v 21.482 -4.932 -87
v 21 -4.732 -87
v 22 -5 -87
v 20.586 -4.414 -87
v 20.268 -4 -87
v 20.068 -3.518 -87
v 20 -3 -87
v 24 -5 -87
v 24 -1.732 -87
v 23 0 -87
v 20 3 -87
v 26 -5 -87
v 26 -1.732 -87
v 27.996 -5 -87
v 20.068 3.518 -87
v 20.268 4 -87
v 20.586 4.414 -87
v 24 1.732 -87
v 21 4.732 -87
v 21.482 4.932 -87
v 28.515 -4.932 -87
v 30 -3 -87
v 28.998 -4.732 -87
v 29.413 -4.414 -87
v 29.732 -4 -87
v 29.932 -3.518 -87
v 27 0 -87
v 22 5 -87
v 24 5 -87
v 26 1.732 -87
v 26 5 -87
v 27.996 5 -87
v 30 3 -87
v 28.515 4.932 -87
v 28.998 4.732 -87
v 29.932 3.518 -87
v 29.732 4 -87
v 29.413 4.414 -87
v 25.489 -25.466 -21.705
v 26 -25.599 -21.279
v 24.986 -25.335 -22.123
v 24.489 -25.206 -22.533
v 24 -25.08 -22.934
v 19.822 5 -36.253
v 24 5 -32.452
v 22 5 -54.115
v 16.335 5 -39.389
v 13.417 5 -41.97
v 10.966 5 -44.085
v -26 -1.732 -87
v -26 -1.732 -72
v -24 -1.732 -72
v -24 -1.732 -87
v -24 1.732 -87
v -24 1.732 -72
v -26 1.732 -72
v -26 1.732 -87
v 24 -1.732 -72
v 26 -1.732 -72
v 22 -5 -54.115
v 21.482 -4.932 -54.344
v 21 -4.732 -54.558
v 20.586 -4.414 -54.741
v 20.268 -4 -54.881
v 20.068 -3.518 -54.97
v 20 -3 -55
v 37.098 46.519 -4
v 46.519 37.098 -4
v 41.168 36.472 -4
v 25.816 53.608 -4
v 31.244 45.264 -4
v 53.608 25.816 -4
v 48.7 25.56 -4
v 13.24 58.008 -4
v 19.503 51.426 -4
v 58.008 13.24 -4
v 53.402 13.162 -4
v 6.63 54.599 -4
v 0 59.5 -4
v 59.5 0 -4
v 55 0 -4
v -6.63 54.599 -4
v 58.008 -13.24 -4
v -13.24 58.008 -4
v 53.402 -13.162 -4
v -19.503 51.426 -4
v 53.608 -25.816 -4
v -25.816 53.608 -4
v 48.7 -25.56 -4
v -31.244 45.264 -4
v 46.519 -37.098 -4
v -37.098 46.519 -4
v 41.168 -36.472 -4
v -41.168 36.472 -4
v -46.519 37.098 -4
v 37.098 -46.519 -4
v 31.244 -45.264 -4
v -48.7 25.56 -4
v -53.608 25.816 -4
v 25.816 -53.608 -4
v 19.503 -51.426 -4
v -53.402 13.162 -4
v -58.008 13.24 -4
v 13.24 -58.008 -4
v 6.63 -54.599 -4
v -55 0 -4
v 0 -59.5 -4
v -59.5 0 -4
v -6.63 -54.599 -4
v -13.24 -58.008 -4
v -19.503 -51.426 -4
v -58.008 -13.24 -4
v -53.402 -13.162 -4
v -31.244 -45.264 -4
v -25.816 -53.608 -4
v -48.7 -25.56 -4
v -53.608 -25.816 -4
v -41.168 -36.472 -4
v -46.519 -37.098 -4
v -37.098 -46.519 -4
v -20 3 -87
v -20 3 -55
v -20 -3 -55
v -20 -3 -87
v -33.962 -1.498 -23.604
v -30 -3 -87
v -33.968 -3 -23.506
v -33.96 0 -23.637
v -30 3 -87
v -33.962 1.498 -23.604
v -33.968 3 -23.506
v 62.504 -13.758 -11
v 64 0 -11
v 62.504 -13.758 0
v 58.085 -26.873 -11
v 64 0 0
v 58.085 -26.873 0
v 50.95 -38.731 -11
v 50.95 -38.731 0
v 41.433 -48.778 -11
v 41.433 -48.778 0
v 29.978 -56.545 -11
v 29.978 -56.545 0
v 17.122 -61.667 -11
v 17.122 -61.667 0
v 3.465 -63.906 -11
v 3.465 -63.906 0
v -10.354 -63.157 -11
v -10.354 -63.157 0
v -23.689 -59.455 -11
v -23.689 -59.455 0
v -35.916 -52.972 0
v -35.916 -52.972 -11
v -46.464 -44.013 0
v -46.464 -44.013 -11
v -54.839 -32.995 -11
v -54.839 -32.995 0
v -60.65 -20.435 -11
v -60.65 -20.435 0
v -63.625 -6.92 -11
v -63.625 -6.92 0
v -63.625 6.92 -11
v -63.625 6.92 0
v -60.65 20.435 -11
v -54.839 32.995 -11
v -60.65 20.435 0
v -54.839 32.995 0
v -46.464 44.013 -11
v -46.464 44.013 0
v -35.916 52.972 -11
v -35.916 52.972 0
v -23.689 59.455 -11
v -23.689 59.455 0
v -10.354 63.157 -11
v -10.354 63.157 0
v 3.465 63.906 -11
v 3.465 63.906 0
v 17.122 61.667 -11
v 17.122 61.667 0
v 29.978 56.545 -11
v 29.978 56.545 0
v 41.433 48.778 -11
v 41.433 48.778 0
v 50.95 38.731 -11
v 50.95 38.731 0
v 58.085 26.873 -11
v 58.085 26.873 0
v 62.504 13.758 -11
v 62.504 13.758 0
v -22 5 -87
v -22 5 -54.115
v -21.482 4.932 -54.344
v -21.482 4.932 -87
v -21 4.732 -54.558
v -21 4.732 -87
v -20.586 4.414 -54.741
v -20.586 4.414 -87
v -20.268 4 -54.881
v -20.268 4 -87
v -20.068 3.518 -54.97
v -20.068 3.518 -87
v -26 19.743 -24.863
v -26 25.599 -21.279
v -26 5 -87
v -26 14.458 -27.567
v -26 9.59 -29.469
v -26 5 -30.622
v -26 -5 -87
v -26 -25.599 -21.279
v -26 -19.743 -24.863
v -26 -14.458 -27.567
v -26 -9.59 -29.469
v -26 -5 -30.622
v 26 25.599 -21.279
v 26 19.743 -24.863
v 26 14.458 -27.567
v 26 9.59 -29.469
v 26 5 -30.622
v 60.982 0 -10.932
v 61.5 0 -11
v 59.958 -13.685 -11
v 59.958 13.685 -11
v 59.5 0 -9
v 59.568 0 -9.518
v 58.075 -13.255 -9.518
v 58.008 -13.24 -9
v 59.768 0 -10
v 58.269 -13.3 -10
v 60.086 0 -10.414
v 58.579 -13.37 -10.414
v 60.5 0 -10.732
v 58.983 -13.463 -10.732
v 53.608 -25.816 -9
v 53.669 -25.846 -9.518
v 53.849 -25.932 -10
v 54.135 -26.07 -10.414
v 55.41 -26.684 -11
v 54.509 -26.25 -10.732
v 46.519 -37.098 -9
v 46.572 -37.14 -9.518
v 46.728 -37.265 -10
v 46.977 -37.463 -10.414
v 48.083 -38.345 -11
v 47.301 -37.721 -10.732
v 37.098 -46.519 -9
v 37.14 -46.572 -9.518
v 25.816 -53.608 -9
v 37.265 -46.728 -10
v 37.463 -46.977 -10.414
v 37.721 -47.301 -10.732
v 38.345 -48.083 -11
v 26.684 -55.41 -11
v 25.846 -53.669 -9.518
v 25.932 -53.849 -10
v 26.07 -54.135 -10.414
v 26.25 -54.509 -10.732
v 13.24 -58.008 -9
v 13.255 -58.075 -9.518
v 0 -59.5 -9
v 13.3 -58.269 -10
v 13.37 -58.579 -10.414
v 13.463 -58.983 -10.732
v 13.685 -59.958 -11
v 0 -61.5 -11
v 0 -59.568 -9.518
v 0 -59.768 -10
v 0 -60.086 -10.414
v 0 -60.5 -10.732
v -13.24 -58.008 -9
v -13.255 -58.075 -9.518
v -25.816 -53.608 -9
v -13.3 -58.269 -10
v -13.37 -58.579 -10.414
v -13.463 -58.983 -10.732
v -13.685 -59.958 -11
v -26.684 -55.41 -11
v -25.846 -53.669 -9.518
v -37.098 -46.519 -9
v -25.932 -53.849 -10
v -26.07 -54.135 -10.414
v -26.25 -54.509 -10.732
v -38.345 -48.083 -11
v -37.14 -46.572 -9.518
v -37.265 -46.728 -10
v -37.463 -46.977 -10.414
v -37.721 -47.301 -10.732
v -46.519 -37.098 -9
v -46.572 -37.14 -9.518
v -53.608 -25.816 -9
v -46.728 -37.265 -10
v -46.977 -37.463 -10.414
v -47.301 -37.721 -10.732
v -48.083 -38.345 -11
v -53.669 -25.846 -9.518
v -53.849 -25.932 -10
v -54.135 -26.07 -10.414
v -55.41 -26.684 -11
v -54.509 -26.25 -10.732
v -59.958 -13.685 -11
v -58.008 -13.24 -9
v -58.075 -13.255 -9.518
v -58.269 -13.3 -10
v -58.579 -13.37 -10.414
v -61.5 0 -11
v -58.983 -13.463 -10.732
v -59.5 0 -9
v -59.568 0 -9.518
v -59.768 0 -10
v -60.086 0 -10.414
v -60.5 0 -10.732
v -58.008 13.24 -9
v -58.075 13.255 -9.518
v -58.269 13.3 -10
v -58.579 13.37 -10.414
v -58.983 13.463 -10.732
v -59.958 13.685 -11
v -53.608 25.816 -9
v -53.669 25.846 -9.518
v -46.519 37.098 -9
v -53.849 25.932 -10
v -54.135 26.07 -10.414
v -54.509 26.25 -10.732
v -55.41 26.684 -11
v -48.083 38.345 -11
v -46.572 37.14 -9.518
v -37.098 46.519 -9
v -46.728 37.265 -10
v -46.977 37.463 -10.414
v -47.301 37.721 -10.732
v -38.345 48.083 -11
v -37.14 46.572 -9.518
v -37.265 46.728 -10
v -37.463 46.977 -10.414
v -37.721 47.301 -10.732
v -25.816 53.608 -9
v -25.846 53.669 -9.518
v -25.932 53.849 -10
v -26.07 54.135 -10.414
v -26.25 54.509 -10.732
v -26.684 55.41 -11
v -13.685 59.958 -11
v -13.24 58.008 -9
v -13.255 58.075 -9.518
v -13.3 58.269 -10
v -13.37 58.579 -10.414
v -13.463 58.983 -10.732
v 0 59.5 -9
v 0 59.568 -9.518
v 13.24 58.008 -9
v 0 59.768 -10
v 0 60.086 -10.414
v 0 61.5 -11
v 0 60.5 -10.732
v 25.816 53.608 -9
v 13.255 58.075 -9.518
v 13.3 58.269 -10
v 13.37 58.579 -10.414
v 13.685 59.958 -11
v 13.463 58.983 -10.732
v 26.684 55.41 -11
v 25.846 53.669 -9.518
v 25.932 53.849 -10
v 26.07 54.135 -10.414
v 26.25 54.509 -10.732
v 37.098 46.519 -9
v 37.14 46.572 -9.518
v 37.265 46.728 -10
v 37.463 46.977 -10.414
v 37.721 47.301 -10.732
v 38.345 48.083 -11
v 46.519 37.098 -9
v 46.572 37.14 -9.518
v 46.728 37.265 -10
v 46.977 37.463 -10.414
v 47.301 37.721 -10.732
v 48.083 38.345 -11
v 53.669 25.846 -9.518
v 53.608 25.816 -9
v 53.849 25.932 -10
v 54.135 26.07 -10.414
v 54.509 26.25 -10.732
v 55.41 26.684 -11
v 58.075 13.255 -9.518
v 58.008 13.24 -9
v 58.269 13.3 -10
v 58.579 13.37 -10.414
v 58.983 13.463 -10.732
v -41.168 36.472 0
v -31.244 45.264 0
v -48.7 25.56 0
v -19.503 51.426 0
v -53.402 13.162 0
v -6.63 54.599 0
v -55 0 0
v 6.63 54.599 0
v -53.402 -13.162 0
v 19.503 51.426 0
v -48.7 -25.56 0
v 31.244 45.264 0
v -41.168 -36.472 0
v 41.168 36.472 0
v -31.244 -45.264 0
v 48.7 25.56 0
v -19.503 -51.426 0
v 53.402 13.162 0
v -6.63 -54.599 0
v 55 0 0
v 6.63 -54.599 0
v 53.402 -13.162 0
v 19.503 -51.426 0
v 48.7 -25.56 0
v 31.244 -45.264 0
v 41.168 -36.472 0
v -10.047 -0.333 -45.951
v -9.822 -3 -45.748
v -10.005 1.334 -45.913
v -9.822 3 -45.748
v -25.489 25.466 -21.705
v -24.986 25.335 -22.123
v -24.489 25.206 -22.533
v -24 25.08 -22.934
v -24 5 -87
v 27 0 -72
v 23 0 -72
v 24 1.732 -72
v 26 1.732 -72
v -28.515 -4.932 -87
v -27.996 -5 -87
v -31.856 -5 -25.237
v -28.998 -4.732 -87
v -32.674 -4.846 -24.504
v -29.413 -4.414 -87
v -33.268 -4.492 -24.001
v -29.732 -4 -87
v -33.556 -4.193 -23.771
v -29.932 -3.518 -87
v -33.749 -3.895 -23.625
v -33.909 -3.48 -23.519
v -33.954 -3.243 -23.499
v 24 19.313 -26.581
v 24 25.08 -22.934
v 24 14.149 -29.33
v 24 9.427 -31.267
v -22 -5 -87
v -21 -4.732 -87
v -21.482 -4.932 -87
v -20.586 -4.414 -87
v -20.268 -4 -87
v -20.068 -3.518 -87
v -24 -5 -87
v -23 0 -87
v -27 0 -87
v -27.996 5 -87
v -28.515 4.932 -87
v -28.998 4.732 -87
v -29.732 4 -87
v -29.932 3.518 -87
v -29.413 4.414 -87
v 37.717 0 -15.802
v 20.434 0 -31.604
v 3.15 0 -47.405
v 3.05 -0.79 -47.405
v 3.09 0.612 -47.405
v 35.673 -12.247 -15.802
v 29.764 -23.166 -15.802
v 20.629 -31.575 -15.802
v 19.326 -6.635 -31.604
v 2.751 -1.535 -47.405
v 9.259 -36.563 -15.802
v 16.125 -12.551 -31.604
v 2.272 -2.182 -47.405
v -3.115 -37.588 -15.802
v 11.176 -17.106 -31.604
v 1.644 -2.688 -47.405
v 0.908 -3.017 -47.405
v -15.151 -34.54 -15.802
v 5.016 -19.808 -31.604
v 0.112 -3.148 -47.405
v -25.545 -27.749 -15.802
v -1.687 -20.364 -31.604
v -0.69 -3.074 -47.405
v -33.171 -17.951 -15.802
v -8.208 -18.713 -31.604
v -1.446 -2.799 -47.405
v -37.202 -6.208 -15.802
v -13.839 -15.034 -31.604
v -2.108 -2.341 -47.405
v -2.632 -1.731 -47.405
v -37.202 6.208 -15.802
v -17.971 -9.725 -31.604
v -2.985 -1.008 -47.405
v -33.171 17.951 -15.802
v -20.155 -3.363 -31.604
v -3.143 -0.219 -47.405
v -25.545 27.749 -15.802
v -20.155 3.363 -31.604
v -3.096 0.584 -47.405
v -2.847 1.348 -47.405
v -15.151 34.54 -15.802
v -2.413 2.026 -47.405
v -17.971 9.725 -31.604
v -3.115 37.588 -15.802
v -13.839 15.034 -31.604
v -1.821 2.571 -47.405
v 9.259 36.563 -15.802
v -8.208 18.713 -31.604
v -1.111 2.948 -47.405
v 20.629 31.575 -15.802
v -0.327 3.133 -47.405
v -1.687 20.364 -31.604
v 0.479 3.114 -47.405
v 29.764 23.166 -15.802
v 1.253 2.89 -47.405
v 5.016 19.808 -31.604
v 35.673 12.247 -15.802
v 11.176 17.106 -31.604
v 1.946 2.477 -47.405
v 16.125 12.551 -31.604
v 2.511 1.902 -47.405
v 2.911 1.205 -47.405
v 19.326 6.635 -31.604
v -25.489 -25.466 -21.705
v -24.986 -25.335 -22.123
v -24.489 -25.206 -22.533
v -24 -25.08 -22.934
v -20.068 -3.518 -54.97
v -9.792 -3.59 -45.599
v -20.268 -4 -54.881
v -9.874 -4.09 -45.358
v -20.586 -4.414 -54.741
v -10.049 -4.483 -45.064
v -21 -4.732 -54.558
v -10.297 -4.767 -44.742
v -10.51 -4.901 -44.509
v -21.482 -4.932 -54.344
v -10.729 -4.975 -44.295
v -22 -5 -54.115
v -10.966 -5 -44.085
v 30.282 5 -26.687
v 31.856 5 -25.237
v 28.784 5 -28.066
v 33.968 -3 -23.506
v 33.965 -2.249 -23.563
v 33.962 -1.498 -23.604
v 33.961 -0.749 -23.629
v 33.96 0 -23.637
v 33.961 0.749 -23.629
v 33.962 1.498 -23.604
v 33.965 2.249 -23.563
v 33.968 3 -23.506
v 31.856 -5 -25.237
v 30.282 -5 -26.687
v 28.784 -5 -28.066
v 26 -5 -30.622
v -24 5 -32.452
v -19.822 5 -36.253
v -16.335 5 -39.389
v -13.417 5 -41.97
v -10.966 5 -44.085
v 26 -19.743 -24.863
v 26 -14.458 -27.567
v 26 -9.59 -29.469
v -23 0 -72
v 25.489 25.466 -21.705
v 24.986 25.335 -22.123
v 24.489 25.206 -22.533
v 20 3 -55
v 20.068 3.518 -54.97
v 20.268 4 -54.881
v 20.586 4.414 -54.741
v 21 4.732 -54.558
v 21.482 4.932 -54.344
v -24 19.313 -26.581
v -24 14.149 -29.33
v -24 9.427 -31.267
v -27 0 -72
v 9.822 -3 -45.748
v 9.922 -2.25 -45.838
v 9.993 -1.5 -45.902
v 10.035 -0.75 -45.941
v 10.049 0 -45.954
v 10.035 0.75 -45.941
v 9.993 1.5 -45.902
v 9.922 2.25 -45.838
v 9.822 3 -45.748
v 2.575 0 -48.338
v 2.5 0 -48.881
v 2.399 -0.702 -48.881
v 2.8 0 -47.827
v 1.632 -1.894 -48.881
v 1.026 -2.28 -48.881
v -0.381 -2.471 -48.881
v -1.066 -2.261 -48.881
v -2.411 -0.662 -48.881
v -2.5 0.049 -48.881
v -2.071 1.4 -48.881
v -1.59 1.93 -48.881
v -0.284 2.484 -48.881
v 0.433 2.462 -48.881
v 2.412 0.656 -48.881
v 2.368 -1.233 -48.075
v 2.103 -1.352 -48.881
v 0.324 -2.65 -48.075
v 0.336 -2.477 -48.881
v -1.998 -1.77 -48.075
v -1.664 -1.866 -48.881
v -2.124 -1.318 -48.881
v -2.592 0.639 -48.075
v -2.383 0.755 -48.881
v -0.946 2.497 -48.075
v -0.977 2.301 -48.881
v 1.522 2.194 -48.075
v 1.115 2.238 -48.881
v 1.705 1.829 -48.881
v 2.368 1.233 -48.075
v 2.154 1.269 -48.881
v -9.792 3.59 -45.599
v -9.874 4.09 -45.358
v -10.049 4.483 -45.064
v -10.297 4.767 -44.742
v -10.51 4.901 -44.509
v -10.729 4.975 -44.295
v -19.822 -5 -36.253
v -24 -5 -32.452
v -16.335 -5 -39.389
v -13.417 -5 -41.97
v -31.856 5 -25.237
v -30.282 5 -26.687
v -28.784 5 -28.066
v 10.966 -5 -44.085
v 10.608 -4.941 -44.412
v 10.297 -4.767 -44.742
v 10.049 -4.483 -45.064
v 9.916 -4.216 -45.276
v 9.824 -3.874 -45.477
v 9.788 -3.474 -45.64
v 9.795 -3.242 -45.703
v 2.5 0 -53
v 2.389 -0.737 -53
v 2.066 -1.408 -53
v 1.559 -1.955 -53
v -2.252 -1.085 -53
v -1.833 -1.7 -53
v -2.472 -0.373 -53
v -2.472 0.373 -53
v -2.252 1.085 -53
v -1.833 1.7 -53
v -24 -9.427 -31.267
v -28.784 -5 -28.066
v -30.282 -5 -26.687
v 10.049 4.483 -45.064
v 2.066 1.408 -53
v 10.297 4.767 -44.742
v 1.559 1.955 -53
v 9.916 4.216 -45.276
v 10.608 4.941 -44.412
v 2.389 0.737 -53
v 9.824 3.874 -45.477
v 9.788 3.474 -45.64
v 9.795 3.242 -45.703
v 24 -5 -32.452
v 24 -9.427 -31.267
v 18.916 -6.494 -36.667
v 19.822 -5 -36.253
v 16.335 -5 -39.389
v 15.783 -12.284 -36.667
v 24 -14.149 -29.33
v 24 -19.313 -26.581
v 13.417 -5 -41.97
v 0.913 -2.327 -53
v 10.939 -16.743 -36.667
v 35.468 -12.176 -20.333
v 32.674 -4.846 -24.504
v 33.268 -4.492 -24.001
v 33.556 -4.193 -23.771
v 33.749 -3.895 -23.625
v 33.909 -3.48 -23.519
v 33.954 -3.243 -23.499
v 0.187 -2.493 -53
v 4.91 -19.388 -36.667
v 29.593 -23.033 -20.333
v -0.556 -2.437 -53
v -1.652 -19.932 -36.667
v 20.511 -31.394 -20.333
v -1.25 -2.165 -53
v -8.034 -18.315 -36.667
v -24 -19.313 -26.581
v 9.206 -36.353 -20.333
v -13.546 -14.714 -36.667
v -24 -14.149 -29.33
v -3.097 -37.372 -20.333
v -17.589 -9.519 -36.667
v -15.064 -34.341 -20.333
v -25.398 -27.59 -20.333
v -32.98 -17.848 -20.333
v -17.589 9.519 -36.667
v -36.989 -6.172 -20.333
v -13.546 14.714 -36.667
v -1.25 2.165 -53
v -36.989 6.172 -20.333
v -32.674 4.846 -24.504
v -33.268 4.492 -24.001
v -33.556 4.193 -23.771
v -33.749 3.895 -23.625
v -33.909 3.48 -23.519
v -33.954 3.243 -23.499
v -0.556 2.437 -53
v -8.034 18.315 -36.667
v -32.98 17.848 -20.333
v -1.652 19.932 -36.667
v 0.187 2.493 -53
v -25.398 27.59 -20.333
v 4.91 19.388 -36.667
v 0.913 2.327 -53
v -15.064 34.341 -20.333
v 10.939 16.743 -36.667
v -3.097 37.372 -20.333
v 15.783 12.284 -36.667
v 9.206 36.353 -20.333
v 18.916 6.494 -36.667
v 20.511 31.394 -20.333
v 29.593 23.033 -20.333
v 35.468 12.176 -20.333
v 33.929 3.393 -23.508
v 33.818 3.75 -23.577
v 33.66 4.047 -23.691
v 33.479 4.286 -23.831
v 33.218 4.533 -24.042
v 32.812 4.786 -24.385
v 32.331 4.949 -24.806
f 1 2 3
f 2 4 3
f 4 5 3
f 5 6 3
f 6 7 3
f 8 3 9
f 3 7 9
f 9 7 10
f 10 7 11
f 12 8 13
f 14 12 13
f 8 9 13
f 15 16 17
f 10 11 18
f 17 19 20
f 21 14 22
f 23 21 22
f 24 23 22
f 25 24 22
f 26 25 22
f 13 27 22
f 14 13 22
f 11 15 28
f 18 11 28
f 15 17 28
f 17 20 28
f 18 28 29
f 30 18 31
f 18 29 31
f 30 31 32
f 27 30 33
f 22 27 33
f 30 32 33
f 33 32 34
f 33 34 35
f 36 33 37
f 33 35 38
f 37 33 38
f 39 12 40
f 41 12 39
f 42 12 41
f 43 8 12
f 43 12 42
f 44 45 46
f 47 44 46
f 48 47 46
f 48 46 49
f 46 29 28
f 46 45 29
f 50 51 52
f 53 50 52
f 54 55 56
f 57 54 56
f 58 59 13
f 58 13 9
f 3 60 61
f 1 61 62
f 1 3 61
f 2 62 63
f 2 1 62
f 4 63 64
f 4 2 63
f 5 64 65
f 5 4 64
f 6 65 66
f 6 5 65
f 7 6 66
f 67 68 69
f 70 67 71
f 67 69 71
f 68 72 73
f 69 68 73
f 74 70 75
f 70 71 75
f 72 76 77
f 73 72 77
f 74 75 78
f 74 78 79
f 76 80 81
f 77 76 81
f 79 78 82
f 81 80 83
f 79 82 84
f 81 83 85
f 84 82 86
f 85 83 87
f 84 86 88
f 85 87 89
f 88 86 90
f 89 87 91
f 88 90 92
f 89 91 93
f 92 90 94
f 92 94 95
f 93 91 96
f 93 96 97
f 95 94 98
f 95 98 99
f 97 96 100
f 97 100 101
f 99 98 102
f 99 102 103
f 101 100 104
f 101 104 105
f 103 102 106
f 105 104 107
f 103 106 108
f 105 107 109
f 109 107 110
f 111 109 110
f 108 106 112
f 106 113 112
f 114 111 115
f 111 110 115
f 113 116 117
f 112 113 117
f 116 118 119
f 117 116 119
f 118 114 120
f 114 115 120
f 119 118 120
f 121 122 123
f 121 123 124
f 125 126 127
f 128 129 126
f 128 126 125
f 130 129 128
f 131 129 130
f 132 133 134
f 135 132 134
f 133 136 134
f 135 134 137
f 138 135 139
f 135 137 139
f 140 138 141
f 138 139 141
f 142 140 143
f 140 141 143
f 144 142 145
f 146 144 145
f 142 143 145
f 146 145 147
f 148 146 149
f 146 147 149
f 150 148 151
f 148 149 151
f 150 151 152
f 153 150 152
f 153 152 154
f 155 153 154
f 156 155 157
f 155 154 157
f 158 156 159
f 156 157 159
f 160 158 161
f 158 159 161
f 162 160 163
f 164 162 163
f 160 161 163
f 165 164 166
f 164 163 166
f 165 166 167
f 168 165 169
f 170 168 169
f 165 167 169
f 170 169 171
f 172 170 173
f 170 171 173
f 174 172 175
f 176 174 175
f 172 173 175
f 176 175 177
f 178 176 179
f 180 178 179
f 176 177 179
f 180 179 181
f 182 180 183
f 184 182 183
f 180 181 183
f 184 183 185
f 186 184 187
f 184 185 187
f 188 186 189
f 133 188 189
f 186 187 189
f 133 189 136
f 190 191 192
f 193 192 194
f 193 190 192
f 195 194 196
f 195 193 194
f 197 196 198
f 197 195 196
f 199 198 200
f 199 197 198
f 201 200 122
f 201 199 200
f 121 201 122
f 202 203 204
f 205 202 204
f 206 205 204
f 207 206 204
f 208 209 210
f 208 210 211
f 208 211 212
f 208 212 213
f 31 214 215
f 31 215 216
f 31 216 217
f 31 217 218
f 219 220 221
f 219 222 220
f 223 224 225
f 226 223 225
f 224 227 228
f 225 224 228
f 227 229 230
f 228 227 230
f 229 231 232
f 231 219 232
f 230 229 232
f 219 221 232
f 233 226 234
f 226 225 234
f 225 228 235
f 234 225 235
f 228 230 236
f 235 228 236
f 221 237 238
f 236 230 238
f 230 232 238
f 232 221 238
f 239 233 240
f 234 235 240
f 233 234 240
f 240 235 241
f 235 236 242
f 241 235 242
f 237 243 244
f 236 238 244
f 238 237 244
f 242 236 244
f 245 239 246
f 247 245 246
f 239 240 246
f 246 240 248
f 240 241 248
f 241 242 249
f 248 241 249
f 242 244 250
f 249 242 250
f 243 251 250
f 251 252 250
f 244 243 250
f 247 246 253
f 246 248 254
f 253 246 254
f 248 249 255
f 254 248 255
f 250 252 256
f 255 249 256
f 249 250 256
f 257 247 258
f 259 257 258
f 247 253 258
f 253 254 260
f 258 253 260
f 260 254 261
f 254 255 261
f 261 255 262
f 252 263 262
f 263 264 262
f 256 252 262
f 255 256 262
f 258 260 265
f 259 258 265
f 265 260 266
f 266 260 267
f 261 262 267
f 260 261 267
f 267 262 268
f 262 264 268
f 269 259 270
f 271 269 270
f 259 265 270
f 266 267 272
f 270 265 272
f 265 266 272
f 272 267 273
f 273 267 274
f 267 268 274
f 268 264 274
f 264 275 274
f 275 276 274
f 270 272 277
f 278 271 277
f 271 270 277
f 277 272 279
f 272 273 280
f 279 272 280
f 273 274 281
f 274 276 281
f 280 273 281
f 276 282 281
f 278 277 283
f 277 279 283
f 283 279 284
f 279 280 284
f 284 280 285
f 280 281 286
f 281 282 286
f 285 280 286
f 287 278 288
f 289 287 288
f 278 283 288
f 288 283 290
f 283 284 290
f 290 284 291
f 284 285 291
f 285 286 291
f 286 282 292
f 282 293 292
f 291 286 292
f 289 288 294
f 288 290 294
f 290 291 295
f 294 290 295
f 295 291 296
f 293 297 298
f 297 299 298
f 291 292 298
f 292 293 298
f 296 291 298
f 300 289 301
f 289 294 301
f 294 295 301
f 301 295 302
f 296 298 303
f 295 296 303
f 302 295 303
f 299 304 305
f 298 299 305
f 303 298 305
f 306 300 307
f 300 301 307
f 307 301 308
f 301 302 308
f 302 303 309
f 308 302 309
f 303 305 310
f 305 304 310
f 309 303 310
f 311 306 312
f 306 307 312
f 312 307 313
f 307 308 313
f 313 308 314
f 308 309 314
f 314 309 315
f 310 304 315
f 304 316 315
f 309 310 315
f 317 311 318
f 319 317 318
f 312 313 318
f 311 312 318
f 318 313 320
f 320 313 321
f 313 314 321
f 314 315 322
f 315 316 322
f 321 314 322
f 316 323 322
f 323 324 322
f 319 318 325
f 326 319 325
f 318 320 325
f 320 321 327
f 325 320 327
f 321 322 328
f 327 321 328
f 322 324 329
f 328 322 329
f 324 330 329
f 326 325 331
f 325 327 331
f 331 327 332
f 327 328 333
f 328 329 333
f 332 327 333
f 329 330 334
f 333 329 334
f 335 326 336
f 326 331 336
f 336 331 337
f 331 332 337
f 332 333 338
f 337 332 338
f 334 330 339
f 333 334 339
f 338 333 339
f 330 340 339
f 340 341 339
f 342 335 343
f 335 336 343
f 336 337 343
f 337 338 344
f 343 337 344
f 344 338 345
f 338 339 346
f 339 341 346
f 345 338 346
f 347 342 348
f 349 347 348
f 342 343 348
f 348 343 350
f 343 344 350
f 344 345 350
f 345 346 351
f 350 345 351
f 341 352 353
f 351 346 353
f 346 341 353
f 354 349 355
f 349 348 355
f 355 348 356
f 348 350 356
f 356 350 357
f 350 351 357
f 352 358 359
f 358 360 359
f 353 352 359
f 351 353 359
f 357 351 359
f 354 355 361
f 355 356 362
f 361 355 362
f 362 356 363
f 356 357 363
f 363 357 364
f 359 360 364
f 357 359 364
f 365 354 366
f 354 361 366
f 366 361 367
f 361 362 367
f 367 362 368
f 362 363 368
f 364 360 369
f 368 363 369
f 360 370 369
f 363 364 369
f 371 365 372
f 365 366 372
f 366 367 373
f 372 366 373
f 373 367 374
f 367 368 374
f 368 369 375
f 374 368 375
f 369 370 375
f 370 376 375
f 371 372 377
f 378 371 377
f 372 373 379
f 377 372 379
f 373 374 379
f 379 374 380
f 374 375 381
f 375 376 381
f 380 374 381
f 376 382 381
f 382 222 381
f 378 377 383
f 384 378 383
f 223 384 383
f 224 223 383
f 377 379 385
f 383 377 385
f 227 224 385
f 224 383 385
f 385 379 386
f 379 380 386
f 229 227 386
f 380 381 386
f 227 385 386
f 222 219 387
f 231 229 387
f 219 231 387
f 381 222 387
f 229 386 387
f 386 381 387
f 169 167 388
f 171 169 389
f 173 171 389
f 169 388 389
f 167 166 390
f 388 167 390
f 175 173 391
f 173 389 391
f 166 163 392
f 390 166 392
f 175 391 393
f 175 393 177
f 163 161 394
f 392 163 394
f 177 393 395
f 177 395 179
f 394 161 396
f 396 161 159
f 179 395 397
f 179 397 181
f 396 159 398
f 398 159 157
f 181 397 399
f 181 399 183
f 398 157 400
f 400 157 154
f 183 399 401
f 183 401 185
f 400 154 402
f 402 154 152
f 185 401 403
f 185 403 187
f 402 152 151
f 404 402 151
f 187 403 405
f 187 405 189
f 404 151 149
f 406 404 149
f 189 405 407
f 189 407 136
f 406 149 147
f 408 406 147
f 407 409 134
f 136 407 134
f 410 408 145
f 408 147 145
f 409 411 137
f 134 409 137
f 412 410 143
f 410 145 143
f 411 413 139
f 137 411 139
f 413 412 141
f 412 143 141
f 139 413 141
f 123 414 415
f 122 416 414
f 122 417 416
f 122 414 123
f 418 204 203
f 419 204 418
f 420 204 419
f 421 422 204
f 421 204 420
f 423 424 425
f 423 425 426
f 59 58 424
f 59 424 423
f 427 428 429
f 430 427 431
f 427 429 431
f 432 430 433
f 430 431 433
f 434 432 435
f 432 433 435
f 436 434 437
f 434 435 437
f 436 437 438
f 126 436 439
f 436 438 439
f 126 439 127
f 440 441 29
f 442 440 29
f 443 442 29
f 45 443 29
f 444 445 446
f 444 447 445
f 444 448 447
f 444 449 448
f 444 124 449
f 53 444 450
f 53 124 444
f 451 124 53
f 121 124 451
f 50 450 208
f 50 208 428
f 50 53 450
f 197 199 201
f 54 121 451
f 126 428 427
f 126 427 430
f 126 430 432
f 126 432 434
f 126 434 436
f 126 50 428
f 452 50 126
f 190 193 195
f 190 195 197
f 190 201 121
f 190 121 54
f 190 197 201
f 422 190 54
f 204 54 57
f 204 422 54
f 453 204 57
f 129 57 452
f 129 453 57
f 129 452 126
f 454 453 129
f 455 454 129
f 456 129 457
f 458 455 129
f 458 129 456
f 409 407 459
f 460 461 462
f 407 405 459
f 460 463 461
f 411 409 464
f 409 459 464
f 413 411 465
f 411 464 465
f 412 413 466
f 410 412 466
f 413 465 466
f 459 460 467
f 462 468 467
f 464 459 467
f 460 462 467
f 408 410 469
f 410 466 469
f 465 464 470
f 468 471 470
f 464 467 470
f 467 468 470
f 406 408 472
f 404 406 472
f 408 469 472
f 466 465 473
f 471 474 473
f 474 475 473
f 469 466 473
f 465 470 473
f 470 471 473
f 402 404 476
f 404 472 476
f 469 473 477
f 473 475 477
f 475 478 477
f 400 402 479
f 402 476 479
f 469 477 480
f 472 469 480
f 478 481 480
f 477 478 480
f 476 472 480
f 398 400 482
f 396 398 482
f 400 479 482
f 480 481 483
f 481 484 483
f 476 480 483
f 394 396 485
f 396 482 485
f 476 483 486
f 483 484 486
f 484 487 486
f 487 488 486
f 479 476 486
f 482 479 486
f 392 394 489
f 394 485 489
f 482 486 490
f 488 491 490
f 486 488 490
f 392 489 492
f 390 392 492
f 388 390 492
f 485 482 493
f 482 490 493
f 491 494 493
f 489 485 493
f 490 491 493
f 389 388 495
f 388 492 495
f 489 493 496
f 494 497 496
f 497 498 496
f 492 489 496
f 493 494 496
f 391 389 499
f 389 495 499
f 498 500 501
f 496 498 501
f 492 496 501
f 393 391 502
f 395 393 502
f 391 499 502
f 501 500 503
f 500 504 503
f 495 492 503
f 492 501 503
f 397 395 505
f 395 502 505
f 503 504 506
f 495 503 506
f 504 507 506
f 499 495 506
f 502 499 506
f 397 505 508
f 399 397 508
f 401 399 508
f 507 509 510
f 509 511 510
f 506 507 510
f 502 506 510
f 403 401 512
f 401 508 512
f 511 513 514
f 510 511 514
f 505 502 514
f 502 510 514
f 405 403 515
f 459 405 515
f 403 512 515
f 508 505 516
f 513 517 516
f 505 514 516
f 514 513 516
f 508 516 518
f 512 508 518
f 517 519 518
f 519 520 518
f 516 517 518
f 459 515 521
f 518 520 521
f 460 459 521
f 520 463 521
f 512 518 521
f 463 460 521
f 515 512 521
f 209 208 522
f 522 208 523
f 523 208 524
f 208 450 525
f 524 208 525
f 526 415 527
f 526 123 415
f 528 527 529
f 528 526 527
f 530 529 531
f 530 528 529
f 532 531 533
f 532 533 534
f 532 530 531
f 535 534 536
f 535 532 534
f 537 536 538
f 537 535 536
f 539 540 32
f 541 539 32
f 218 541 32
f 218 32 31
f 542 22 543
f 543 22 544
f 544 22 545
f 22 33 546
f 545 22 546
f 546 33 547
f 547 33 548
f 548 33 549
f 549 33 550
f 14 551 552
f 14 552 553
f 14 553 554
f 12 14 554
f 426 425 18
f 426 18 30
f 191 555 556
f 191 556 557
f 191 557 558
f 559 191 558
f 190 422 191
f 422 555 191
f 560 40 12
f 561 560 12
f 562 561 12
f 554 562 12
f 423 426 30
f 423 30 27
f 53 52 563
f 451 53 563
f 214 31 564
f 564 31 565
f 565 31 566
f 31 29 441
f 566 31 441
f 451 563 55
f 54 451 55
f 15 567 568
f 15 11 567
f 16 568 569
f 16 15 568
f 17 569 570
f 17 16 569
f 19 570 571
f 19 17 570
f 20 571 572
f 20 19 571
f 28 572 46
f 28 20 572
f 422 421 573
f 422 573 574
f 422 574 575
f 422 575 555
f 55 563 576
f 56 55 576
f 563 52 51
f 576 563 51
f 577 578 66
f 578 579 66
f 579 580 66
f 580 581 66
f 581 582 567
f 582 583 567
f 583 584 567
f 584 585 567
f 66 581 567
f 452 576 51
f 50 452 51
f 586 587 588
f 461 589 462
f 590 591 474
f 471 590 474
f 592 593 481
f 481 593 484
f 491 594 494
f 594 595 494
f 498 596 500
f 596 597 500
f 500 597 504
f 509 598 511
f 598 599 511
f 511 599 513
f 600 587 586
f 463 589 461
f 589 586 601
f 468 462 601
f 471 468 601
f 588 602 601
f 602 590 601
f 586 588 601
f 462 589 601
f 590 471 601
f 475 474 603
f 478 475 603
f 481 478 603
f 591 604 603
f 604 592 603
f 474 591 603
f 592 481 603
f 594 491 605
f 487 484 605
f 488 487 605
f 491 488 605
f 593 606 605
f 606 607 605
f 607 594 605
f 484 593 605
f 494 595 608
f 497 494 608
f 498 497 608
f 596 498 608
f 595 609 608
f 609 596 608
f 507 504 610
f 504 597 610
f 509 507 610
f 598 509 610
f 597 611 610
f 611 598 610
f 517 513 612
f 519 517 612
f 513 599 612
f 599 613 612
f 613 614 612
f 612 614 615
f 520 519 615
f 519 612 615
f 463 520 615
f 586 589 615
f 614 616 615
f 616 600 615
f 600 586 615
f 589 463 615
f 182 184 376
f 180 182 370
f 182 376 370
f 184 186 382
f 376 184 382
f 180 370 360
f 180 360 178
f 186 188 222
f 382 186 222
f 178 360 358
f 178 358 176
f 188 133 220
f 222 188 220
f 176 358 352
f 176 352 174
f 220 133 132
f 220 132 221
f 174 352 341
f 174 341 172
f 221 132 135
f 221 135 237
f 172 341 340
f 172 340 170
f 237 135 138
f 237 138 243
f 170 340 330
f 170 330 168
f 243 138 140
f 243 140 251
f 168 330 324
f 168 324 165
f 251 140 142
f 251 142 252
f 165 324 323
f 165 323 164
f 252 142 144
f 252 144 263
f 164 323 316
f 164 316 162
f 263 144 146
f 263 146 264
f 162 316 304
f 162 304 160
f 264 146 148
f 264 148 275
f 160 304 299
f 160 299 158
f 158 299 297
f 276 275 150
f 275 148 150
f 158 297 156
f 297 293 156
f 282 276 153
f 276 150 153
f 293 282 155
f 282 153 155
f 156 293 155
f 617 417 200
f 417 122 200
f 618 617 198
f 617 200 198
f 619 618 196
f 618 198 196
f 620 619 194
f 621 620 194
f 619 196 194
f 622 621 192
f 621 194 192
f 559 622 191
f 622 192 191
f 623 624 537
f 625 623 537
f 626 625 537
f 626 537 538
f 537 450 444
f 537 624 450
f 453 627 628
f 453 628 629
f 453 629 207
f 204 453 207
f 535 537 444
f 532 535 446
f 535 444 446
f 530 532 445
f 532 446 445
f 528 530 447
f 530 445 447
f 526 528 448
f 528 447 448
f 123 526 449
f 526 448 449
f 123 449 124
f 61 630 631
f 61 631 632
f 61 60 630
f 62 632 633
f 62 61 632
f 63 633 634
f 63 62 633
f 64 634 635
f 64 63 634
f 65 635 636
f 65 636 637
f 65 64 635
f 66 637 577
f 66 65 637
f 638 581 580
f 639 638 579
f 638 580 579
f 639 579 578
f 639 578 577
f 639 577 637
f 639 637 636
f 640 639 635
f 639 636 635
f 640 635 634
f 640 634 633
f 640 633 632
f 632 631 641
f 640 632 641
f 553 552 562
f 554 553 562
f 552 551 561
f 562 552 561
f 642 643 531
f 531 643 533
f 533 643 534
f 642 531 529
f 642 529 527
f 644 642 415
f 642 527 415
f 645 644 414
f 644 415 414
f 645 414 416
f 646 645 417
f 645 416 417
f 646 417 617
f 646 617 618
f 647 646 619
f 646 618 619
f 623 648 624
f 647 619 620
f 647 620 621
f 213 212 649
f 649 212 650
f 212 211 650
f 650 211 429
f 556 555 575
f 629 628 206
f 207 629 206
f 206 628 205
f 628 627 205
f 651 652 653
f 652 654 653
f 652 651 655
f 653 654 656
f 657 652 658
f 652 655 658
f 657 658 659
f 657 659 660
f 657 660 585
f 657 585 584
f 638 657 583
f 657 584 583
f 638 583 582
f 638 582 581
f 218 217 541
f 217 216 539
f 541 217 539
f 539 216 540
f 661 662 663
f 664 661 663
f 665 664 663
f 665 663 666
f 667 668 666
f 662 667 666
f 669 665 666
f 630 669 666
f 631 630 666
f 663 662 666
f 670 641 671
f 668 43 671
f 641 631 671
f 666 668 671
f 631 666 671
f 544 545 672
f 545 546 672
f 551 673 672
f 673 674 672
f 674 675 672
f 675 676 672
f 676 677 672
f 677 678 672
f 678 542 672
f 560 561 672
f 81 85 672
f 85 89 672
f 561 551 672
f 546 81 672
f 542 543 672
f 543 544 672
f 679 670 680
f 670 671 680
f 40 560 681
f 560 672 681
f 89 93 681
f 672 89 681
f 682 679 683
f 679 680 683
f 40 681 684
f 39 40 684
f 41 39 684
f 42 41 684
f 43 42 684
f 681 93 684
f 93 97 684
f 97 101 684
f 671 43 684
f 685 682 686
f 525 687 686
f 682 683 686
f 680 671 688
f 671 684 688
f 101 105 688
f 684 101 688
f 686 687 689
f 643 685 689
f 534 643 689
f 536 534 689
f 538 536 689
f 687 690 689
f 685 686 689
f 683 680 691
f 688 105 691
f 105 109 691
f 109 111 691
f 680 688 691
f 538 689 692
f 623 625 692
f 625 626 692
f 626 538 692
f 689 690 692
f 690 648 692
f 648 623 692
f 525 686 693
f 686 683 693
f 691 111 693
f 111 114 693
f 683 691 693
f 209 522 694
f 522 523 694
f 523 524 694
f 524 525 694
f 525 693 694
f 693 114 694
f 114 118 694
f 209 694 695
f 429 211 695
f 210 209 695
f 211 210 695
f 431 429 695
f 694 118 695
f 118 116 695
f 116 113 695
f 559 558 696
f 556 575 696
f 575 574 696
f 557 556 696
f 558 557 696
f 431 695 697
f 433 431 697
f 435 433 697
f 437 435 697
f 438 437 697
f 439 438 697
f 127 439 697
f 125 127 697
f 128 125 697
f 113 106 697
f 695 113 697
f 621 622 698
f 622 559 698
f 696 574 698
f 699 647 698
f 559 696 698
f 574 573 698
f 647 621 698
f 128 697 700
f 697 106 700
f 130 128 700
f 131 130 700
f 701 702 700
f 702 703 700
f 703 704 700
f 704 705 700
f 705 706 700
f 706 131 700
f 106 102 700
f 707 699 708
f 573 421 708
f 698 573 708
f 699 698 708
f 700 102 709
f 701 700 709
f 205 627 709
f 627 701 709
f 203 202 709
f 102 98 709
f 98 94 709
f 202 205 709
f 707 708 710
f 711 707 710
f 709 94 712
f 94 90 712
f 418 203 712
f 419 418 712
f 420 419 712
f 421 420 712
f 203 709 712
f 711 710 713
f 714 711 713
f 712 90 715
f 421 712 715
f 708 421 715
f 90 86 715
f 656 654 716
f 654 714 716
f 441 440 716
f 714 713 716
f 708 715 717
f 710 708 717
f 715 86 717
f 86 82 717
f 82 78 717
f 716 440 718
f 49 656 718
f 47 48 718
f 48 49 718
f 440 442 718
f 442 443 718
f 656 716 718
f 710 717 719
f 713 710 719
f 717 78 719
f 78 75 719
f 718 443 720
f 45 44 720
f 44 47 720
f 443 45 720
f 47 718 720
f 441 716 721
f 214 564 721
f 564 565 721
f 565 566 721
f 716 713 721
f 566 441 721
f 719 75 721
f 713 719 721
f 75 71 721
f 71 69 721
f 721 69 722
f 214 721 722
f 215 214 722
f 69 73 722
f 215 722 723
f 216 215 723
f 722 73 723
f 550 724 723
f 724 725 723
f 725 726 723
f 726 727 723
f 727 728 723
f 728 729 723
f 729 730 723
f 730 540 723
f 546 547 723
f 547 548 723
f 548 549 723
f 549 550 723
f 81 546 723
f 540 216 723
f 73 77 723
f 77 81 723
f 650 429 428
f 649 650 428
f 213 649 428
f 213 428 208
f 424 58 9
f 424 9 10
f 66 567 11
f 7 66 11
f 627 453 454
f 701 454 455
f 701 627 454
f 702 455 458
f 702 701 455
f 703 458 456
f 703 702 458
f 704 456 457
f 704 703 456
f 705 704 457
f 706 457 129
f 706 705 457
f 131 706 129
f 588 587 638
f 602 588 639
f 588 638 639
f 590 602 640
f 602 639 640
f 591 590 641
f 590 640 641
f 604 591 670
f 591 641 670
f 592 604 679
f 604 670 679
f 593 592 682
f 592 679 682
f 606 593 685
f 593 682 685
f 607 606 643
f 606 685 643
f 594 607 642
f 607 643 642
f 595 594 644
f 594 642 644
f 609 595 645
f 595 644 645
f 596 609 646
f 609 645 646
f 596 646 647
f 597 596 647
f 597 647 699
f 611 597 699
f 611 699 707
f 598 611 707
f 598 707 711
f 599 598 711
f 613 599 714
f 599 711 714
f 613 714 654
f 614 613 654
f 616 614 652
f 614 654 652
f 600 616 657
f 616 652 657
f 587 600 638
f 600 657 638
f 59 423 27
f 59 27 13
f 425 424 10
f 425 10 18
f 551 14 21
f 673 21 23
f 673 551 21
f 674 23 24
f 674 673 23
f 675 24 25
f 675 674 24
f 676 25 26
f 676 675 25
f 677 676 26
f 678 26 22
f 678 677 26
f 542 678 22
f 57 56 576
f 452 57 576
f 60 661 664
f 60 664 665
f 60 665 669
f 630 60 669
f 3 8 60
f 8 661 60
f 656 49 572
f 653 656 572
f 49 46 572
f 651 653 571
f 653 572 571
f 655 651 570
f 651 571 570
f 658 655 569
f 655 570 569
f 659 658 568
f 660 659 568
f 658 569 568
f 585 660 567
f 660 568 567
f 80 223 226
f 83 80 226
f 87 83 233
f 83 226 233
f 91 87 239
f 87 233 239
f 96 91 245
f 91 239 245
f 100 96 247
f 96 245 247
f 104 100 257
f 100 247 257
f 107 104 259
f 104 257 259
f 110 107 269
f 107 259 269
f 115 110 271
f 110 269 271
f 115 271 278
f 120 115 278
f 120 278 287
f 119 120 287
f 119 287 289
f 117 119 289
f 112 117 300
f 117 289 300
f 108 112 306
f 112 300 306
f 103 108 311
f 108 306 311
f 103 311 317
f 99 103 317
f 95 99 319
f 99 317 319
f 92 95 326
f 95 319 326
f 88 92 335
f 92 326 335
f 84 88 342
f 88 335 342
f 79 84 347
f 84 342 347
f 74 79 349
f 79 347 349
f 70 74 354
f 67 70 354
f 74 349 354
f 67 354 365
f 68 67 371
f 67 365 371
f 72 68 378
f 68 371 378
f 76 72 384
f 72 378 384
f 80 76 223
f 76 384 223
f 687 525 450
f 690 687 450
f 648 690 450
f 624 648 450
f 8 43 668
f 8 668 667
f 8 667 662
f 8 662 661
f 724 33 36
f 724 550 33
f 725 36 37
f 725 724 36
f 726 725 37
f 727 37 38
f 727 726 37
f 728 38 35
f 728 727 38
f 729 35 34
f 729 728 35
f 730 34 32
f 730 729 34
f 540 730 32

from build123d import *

# Parameters (mm, degrees)
PAD_DEPTH                  = 5
POCKET_DEPTH               = 416.682466
PAD001_DEPTH               = 1
PAD001_MIRRORED002_2_DEPTH = 1
FILLET_R                   = 2
BODY_PLACEMENT_ANGLE       = 180


with BuildPart() as part:
    # Sketch → Revolution (revolve)
    with BuildSketch(Plane.XZ):
        Polygon((2.5, 53), (55, 4), (59.5, 4), (59.5, 11), (64, 11), (64, 0), (55, 0), (2.5, 48), align=None)
    revolve(axis=Axis((0, 0, 0), (0, 0, 1)))

    # Sketch001 → Pad (new body, symmetric)
    with BuildSketch(Plane.XZ):
        Polygon((9, 45), (20, 55), (20, 87), (30, 87), (34, 23), align=None)
    pad = extrude(amount=PAD_DEPTH, both=True)

    # Mirrored: Pad across Sketch001 V_Axis
    add(pad.mirror(Plane(origin=(0, 0, 0), x_dir=(0, -1, 0), z_dir=(1, 0, 0))))

    # Sketch003 (on DatumPlane) → Pocket (cut, through all)
    with BuildSketch(Plane.XY.offset(72)):
        Polygon((27, 0), (26, 1.732051), (24, 1.732051), (23, 0), (24, -1.732051), (26, -1.732051), align=None)
    pocket = extrude(amount=POCKET_DEPTH, mode=Mode.SUBTRACT)

    # Mirrored001: Pocket across Sketch003 V_Axis
    add(pocket.mirror(Plane(origin=(0, 0, 72), x_dir=(0, 0, 1), z_dir=(1, 0, 0))), mode=Mode.SUBTRACT)

    # Sketch004 (on DatumPlane) → Pad001 (join, symmetric)
    with BuildSketch(Plane.YZ.offset(-25)):
        Polygon((5, 87), (26, 20), (4, 30), (4, 86), align=None)
    pad001 = extrude(amount=PAD001_DEPTH, both=True)

    # Sketch004 Mirrored002 2 → Pad001 Mirrored002 2 (add, symmetric)
    with BuildSketch(Plane(origin=(-25, 0, 0), x_dir=(0, -1, 0), z_dir=(-1, 0, 0))):
        Polygon((5, 87), (26, 20), (4, 30), (4, 86), align=None)
    pad001_mirrored002_2 = extrude(amount=-PAD001_MIRRORED002_2_DEPTH, both=True)

    # Mirrored003: Pad001, Pad001 Mirrored002 2 across YZ
    add(pad001.mirror(Plane.YZ))
    add(pad001_mirrored002_2.mirror(Plane.YZ))

    # Fillet
    fillet_edges = [part.edges().sort_by_distance(p)[0] for p in [
        (-31.991421, -5, 55.137271),
        (-31.991421, 5, 55.137271),
        (31.991421, -5, 55.137271),
        (31.991421, 5, 55.137271),
        (-20, 5, 71),
        (-20, -5, 71),
        (-14.709357, -5, 50.190324),
        (14.709357, -5, 50.190324),
        (20, -5, 71),
        (-2.5, 0, 48),
        (-59.5, 0, 11),
        (20, 5, 71),
        (14.709357, 5, 50.190324),
        (-14.709357, 5, 50.190324),
    ]]
    fillet(fillet_edges, radius=FILLET_R)


with BuildPart() as part_1:
    # Body placement: moved
    add(part.part.rotate(Axis((0, 0, 0), (1, 0, 0)), BODY_PLACEMENT_ANGLE))


solid = part_1.part
